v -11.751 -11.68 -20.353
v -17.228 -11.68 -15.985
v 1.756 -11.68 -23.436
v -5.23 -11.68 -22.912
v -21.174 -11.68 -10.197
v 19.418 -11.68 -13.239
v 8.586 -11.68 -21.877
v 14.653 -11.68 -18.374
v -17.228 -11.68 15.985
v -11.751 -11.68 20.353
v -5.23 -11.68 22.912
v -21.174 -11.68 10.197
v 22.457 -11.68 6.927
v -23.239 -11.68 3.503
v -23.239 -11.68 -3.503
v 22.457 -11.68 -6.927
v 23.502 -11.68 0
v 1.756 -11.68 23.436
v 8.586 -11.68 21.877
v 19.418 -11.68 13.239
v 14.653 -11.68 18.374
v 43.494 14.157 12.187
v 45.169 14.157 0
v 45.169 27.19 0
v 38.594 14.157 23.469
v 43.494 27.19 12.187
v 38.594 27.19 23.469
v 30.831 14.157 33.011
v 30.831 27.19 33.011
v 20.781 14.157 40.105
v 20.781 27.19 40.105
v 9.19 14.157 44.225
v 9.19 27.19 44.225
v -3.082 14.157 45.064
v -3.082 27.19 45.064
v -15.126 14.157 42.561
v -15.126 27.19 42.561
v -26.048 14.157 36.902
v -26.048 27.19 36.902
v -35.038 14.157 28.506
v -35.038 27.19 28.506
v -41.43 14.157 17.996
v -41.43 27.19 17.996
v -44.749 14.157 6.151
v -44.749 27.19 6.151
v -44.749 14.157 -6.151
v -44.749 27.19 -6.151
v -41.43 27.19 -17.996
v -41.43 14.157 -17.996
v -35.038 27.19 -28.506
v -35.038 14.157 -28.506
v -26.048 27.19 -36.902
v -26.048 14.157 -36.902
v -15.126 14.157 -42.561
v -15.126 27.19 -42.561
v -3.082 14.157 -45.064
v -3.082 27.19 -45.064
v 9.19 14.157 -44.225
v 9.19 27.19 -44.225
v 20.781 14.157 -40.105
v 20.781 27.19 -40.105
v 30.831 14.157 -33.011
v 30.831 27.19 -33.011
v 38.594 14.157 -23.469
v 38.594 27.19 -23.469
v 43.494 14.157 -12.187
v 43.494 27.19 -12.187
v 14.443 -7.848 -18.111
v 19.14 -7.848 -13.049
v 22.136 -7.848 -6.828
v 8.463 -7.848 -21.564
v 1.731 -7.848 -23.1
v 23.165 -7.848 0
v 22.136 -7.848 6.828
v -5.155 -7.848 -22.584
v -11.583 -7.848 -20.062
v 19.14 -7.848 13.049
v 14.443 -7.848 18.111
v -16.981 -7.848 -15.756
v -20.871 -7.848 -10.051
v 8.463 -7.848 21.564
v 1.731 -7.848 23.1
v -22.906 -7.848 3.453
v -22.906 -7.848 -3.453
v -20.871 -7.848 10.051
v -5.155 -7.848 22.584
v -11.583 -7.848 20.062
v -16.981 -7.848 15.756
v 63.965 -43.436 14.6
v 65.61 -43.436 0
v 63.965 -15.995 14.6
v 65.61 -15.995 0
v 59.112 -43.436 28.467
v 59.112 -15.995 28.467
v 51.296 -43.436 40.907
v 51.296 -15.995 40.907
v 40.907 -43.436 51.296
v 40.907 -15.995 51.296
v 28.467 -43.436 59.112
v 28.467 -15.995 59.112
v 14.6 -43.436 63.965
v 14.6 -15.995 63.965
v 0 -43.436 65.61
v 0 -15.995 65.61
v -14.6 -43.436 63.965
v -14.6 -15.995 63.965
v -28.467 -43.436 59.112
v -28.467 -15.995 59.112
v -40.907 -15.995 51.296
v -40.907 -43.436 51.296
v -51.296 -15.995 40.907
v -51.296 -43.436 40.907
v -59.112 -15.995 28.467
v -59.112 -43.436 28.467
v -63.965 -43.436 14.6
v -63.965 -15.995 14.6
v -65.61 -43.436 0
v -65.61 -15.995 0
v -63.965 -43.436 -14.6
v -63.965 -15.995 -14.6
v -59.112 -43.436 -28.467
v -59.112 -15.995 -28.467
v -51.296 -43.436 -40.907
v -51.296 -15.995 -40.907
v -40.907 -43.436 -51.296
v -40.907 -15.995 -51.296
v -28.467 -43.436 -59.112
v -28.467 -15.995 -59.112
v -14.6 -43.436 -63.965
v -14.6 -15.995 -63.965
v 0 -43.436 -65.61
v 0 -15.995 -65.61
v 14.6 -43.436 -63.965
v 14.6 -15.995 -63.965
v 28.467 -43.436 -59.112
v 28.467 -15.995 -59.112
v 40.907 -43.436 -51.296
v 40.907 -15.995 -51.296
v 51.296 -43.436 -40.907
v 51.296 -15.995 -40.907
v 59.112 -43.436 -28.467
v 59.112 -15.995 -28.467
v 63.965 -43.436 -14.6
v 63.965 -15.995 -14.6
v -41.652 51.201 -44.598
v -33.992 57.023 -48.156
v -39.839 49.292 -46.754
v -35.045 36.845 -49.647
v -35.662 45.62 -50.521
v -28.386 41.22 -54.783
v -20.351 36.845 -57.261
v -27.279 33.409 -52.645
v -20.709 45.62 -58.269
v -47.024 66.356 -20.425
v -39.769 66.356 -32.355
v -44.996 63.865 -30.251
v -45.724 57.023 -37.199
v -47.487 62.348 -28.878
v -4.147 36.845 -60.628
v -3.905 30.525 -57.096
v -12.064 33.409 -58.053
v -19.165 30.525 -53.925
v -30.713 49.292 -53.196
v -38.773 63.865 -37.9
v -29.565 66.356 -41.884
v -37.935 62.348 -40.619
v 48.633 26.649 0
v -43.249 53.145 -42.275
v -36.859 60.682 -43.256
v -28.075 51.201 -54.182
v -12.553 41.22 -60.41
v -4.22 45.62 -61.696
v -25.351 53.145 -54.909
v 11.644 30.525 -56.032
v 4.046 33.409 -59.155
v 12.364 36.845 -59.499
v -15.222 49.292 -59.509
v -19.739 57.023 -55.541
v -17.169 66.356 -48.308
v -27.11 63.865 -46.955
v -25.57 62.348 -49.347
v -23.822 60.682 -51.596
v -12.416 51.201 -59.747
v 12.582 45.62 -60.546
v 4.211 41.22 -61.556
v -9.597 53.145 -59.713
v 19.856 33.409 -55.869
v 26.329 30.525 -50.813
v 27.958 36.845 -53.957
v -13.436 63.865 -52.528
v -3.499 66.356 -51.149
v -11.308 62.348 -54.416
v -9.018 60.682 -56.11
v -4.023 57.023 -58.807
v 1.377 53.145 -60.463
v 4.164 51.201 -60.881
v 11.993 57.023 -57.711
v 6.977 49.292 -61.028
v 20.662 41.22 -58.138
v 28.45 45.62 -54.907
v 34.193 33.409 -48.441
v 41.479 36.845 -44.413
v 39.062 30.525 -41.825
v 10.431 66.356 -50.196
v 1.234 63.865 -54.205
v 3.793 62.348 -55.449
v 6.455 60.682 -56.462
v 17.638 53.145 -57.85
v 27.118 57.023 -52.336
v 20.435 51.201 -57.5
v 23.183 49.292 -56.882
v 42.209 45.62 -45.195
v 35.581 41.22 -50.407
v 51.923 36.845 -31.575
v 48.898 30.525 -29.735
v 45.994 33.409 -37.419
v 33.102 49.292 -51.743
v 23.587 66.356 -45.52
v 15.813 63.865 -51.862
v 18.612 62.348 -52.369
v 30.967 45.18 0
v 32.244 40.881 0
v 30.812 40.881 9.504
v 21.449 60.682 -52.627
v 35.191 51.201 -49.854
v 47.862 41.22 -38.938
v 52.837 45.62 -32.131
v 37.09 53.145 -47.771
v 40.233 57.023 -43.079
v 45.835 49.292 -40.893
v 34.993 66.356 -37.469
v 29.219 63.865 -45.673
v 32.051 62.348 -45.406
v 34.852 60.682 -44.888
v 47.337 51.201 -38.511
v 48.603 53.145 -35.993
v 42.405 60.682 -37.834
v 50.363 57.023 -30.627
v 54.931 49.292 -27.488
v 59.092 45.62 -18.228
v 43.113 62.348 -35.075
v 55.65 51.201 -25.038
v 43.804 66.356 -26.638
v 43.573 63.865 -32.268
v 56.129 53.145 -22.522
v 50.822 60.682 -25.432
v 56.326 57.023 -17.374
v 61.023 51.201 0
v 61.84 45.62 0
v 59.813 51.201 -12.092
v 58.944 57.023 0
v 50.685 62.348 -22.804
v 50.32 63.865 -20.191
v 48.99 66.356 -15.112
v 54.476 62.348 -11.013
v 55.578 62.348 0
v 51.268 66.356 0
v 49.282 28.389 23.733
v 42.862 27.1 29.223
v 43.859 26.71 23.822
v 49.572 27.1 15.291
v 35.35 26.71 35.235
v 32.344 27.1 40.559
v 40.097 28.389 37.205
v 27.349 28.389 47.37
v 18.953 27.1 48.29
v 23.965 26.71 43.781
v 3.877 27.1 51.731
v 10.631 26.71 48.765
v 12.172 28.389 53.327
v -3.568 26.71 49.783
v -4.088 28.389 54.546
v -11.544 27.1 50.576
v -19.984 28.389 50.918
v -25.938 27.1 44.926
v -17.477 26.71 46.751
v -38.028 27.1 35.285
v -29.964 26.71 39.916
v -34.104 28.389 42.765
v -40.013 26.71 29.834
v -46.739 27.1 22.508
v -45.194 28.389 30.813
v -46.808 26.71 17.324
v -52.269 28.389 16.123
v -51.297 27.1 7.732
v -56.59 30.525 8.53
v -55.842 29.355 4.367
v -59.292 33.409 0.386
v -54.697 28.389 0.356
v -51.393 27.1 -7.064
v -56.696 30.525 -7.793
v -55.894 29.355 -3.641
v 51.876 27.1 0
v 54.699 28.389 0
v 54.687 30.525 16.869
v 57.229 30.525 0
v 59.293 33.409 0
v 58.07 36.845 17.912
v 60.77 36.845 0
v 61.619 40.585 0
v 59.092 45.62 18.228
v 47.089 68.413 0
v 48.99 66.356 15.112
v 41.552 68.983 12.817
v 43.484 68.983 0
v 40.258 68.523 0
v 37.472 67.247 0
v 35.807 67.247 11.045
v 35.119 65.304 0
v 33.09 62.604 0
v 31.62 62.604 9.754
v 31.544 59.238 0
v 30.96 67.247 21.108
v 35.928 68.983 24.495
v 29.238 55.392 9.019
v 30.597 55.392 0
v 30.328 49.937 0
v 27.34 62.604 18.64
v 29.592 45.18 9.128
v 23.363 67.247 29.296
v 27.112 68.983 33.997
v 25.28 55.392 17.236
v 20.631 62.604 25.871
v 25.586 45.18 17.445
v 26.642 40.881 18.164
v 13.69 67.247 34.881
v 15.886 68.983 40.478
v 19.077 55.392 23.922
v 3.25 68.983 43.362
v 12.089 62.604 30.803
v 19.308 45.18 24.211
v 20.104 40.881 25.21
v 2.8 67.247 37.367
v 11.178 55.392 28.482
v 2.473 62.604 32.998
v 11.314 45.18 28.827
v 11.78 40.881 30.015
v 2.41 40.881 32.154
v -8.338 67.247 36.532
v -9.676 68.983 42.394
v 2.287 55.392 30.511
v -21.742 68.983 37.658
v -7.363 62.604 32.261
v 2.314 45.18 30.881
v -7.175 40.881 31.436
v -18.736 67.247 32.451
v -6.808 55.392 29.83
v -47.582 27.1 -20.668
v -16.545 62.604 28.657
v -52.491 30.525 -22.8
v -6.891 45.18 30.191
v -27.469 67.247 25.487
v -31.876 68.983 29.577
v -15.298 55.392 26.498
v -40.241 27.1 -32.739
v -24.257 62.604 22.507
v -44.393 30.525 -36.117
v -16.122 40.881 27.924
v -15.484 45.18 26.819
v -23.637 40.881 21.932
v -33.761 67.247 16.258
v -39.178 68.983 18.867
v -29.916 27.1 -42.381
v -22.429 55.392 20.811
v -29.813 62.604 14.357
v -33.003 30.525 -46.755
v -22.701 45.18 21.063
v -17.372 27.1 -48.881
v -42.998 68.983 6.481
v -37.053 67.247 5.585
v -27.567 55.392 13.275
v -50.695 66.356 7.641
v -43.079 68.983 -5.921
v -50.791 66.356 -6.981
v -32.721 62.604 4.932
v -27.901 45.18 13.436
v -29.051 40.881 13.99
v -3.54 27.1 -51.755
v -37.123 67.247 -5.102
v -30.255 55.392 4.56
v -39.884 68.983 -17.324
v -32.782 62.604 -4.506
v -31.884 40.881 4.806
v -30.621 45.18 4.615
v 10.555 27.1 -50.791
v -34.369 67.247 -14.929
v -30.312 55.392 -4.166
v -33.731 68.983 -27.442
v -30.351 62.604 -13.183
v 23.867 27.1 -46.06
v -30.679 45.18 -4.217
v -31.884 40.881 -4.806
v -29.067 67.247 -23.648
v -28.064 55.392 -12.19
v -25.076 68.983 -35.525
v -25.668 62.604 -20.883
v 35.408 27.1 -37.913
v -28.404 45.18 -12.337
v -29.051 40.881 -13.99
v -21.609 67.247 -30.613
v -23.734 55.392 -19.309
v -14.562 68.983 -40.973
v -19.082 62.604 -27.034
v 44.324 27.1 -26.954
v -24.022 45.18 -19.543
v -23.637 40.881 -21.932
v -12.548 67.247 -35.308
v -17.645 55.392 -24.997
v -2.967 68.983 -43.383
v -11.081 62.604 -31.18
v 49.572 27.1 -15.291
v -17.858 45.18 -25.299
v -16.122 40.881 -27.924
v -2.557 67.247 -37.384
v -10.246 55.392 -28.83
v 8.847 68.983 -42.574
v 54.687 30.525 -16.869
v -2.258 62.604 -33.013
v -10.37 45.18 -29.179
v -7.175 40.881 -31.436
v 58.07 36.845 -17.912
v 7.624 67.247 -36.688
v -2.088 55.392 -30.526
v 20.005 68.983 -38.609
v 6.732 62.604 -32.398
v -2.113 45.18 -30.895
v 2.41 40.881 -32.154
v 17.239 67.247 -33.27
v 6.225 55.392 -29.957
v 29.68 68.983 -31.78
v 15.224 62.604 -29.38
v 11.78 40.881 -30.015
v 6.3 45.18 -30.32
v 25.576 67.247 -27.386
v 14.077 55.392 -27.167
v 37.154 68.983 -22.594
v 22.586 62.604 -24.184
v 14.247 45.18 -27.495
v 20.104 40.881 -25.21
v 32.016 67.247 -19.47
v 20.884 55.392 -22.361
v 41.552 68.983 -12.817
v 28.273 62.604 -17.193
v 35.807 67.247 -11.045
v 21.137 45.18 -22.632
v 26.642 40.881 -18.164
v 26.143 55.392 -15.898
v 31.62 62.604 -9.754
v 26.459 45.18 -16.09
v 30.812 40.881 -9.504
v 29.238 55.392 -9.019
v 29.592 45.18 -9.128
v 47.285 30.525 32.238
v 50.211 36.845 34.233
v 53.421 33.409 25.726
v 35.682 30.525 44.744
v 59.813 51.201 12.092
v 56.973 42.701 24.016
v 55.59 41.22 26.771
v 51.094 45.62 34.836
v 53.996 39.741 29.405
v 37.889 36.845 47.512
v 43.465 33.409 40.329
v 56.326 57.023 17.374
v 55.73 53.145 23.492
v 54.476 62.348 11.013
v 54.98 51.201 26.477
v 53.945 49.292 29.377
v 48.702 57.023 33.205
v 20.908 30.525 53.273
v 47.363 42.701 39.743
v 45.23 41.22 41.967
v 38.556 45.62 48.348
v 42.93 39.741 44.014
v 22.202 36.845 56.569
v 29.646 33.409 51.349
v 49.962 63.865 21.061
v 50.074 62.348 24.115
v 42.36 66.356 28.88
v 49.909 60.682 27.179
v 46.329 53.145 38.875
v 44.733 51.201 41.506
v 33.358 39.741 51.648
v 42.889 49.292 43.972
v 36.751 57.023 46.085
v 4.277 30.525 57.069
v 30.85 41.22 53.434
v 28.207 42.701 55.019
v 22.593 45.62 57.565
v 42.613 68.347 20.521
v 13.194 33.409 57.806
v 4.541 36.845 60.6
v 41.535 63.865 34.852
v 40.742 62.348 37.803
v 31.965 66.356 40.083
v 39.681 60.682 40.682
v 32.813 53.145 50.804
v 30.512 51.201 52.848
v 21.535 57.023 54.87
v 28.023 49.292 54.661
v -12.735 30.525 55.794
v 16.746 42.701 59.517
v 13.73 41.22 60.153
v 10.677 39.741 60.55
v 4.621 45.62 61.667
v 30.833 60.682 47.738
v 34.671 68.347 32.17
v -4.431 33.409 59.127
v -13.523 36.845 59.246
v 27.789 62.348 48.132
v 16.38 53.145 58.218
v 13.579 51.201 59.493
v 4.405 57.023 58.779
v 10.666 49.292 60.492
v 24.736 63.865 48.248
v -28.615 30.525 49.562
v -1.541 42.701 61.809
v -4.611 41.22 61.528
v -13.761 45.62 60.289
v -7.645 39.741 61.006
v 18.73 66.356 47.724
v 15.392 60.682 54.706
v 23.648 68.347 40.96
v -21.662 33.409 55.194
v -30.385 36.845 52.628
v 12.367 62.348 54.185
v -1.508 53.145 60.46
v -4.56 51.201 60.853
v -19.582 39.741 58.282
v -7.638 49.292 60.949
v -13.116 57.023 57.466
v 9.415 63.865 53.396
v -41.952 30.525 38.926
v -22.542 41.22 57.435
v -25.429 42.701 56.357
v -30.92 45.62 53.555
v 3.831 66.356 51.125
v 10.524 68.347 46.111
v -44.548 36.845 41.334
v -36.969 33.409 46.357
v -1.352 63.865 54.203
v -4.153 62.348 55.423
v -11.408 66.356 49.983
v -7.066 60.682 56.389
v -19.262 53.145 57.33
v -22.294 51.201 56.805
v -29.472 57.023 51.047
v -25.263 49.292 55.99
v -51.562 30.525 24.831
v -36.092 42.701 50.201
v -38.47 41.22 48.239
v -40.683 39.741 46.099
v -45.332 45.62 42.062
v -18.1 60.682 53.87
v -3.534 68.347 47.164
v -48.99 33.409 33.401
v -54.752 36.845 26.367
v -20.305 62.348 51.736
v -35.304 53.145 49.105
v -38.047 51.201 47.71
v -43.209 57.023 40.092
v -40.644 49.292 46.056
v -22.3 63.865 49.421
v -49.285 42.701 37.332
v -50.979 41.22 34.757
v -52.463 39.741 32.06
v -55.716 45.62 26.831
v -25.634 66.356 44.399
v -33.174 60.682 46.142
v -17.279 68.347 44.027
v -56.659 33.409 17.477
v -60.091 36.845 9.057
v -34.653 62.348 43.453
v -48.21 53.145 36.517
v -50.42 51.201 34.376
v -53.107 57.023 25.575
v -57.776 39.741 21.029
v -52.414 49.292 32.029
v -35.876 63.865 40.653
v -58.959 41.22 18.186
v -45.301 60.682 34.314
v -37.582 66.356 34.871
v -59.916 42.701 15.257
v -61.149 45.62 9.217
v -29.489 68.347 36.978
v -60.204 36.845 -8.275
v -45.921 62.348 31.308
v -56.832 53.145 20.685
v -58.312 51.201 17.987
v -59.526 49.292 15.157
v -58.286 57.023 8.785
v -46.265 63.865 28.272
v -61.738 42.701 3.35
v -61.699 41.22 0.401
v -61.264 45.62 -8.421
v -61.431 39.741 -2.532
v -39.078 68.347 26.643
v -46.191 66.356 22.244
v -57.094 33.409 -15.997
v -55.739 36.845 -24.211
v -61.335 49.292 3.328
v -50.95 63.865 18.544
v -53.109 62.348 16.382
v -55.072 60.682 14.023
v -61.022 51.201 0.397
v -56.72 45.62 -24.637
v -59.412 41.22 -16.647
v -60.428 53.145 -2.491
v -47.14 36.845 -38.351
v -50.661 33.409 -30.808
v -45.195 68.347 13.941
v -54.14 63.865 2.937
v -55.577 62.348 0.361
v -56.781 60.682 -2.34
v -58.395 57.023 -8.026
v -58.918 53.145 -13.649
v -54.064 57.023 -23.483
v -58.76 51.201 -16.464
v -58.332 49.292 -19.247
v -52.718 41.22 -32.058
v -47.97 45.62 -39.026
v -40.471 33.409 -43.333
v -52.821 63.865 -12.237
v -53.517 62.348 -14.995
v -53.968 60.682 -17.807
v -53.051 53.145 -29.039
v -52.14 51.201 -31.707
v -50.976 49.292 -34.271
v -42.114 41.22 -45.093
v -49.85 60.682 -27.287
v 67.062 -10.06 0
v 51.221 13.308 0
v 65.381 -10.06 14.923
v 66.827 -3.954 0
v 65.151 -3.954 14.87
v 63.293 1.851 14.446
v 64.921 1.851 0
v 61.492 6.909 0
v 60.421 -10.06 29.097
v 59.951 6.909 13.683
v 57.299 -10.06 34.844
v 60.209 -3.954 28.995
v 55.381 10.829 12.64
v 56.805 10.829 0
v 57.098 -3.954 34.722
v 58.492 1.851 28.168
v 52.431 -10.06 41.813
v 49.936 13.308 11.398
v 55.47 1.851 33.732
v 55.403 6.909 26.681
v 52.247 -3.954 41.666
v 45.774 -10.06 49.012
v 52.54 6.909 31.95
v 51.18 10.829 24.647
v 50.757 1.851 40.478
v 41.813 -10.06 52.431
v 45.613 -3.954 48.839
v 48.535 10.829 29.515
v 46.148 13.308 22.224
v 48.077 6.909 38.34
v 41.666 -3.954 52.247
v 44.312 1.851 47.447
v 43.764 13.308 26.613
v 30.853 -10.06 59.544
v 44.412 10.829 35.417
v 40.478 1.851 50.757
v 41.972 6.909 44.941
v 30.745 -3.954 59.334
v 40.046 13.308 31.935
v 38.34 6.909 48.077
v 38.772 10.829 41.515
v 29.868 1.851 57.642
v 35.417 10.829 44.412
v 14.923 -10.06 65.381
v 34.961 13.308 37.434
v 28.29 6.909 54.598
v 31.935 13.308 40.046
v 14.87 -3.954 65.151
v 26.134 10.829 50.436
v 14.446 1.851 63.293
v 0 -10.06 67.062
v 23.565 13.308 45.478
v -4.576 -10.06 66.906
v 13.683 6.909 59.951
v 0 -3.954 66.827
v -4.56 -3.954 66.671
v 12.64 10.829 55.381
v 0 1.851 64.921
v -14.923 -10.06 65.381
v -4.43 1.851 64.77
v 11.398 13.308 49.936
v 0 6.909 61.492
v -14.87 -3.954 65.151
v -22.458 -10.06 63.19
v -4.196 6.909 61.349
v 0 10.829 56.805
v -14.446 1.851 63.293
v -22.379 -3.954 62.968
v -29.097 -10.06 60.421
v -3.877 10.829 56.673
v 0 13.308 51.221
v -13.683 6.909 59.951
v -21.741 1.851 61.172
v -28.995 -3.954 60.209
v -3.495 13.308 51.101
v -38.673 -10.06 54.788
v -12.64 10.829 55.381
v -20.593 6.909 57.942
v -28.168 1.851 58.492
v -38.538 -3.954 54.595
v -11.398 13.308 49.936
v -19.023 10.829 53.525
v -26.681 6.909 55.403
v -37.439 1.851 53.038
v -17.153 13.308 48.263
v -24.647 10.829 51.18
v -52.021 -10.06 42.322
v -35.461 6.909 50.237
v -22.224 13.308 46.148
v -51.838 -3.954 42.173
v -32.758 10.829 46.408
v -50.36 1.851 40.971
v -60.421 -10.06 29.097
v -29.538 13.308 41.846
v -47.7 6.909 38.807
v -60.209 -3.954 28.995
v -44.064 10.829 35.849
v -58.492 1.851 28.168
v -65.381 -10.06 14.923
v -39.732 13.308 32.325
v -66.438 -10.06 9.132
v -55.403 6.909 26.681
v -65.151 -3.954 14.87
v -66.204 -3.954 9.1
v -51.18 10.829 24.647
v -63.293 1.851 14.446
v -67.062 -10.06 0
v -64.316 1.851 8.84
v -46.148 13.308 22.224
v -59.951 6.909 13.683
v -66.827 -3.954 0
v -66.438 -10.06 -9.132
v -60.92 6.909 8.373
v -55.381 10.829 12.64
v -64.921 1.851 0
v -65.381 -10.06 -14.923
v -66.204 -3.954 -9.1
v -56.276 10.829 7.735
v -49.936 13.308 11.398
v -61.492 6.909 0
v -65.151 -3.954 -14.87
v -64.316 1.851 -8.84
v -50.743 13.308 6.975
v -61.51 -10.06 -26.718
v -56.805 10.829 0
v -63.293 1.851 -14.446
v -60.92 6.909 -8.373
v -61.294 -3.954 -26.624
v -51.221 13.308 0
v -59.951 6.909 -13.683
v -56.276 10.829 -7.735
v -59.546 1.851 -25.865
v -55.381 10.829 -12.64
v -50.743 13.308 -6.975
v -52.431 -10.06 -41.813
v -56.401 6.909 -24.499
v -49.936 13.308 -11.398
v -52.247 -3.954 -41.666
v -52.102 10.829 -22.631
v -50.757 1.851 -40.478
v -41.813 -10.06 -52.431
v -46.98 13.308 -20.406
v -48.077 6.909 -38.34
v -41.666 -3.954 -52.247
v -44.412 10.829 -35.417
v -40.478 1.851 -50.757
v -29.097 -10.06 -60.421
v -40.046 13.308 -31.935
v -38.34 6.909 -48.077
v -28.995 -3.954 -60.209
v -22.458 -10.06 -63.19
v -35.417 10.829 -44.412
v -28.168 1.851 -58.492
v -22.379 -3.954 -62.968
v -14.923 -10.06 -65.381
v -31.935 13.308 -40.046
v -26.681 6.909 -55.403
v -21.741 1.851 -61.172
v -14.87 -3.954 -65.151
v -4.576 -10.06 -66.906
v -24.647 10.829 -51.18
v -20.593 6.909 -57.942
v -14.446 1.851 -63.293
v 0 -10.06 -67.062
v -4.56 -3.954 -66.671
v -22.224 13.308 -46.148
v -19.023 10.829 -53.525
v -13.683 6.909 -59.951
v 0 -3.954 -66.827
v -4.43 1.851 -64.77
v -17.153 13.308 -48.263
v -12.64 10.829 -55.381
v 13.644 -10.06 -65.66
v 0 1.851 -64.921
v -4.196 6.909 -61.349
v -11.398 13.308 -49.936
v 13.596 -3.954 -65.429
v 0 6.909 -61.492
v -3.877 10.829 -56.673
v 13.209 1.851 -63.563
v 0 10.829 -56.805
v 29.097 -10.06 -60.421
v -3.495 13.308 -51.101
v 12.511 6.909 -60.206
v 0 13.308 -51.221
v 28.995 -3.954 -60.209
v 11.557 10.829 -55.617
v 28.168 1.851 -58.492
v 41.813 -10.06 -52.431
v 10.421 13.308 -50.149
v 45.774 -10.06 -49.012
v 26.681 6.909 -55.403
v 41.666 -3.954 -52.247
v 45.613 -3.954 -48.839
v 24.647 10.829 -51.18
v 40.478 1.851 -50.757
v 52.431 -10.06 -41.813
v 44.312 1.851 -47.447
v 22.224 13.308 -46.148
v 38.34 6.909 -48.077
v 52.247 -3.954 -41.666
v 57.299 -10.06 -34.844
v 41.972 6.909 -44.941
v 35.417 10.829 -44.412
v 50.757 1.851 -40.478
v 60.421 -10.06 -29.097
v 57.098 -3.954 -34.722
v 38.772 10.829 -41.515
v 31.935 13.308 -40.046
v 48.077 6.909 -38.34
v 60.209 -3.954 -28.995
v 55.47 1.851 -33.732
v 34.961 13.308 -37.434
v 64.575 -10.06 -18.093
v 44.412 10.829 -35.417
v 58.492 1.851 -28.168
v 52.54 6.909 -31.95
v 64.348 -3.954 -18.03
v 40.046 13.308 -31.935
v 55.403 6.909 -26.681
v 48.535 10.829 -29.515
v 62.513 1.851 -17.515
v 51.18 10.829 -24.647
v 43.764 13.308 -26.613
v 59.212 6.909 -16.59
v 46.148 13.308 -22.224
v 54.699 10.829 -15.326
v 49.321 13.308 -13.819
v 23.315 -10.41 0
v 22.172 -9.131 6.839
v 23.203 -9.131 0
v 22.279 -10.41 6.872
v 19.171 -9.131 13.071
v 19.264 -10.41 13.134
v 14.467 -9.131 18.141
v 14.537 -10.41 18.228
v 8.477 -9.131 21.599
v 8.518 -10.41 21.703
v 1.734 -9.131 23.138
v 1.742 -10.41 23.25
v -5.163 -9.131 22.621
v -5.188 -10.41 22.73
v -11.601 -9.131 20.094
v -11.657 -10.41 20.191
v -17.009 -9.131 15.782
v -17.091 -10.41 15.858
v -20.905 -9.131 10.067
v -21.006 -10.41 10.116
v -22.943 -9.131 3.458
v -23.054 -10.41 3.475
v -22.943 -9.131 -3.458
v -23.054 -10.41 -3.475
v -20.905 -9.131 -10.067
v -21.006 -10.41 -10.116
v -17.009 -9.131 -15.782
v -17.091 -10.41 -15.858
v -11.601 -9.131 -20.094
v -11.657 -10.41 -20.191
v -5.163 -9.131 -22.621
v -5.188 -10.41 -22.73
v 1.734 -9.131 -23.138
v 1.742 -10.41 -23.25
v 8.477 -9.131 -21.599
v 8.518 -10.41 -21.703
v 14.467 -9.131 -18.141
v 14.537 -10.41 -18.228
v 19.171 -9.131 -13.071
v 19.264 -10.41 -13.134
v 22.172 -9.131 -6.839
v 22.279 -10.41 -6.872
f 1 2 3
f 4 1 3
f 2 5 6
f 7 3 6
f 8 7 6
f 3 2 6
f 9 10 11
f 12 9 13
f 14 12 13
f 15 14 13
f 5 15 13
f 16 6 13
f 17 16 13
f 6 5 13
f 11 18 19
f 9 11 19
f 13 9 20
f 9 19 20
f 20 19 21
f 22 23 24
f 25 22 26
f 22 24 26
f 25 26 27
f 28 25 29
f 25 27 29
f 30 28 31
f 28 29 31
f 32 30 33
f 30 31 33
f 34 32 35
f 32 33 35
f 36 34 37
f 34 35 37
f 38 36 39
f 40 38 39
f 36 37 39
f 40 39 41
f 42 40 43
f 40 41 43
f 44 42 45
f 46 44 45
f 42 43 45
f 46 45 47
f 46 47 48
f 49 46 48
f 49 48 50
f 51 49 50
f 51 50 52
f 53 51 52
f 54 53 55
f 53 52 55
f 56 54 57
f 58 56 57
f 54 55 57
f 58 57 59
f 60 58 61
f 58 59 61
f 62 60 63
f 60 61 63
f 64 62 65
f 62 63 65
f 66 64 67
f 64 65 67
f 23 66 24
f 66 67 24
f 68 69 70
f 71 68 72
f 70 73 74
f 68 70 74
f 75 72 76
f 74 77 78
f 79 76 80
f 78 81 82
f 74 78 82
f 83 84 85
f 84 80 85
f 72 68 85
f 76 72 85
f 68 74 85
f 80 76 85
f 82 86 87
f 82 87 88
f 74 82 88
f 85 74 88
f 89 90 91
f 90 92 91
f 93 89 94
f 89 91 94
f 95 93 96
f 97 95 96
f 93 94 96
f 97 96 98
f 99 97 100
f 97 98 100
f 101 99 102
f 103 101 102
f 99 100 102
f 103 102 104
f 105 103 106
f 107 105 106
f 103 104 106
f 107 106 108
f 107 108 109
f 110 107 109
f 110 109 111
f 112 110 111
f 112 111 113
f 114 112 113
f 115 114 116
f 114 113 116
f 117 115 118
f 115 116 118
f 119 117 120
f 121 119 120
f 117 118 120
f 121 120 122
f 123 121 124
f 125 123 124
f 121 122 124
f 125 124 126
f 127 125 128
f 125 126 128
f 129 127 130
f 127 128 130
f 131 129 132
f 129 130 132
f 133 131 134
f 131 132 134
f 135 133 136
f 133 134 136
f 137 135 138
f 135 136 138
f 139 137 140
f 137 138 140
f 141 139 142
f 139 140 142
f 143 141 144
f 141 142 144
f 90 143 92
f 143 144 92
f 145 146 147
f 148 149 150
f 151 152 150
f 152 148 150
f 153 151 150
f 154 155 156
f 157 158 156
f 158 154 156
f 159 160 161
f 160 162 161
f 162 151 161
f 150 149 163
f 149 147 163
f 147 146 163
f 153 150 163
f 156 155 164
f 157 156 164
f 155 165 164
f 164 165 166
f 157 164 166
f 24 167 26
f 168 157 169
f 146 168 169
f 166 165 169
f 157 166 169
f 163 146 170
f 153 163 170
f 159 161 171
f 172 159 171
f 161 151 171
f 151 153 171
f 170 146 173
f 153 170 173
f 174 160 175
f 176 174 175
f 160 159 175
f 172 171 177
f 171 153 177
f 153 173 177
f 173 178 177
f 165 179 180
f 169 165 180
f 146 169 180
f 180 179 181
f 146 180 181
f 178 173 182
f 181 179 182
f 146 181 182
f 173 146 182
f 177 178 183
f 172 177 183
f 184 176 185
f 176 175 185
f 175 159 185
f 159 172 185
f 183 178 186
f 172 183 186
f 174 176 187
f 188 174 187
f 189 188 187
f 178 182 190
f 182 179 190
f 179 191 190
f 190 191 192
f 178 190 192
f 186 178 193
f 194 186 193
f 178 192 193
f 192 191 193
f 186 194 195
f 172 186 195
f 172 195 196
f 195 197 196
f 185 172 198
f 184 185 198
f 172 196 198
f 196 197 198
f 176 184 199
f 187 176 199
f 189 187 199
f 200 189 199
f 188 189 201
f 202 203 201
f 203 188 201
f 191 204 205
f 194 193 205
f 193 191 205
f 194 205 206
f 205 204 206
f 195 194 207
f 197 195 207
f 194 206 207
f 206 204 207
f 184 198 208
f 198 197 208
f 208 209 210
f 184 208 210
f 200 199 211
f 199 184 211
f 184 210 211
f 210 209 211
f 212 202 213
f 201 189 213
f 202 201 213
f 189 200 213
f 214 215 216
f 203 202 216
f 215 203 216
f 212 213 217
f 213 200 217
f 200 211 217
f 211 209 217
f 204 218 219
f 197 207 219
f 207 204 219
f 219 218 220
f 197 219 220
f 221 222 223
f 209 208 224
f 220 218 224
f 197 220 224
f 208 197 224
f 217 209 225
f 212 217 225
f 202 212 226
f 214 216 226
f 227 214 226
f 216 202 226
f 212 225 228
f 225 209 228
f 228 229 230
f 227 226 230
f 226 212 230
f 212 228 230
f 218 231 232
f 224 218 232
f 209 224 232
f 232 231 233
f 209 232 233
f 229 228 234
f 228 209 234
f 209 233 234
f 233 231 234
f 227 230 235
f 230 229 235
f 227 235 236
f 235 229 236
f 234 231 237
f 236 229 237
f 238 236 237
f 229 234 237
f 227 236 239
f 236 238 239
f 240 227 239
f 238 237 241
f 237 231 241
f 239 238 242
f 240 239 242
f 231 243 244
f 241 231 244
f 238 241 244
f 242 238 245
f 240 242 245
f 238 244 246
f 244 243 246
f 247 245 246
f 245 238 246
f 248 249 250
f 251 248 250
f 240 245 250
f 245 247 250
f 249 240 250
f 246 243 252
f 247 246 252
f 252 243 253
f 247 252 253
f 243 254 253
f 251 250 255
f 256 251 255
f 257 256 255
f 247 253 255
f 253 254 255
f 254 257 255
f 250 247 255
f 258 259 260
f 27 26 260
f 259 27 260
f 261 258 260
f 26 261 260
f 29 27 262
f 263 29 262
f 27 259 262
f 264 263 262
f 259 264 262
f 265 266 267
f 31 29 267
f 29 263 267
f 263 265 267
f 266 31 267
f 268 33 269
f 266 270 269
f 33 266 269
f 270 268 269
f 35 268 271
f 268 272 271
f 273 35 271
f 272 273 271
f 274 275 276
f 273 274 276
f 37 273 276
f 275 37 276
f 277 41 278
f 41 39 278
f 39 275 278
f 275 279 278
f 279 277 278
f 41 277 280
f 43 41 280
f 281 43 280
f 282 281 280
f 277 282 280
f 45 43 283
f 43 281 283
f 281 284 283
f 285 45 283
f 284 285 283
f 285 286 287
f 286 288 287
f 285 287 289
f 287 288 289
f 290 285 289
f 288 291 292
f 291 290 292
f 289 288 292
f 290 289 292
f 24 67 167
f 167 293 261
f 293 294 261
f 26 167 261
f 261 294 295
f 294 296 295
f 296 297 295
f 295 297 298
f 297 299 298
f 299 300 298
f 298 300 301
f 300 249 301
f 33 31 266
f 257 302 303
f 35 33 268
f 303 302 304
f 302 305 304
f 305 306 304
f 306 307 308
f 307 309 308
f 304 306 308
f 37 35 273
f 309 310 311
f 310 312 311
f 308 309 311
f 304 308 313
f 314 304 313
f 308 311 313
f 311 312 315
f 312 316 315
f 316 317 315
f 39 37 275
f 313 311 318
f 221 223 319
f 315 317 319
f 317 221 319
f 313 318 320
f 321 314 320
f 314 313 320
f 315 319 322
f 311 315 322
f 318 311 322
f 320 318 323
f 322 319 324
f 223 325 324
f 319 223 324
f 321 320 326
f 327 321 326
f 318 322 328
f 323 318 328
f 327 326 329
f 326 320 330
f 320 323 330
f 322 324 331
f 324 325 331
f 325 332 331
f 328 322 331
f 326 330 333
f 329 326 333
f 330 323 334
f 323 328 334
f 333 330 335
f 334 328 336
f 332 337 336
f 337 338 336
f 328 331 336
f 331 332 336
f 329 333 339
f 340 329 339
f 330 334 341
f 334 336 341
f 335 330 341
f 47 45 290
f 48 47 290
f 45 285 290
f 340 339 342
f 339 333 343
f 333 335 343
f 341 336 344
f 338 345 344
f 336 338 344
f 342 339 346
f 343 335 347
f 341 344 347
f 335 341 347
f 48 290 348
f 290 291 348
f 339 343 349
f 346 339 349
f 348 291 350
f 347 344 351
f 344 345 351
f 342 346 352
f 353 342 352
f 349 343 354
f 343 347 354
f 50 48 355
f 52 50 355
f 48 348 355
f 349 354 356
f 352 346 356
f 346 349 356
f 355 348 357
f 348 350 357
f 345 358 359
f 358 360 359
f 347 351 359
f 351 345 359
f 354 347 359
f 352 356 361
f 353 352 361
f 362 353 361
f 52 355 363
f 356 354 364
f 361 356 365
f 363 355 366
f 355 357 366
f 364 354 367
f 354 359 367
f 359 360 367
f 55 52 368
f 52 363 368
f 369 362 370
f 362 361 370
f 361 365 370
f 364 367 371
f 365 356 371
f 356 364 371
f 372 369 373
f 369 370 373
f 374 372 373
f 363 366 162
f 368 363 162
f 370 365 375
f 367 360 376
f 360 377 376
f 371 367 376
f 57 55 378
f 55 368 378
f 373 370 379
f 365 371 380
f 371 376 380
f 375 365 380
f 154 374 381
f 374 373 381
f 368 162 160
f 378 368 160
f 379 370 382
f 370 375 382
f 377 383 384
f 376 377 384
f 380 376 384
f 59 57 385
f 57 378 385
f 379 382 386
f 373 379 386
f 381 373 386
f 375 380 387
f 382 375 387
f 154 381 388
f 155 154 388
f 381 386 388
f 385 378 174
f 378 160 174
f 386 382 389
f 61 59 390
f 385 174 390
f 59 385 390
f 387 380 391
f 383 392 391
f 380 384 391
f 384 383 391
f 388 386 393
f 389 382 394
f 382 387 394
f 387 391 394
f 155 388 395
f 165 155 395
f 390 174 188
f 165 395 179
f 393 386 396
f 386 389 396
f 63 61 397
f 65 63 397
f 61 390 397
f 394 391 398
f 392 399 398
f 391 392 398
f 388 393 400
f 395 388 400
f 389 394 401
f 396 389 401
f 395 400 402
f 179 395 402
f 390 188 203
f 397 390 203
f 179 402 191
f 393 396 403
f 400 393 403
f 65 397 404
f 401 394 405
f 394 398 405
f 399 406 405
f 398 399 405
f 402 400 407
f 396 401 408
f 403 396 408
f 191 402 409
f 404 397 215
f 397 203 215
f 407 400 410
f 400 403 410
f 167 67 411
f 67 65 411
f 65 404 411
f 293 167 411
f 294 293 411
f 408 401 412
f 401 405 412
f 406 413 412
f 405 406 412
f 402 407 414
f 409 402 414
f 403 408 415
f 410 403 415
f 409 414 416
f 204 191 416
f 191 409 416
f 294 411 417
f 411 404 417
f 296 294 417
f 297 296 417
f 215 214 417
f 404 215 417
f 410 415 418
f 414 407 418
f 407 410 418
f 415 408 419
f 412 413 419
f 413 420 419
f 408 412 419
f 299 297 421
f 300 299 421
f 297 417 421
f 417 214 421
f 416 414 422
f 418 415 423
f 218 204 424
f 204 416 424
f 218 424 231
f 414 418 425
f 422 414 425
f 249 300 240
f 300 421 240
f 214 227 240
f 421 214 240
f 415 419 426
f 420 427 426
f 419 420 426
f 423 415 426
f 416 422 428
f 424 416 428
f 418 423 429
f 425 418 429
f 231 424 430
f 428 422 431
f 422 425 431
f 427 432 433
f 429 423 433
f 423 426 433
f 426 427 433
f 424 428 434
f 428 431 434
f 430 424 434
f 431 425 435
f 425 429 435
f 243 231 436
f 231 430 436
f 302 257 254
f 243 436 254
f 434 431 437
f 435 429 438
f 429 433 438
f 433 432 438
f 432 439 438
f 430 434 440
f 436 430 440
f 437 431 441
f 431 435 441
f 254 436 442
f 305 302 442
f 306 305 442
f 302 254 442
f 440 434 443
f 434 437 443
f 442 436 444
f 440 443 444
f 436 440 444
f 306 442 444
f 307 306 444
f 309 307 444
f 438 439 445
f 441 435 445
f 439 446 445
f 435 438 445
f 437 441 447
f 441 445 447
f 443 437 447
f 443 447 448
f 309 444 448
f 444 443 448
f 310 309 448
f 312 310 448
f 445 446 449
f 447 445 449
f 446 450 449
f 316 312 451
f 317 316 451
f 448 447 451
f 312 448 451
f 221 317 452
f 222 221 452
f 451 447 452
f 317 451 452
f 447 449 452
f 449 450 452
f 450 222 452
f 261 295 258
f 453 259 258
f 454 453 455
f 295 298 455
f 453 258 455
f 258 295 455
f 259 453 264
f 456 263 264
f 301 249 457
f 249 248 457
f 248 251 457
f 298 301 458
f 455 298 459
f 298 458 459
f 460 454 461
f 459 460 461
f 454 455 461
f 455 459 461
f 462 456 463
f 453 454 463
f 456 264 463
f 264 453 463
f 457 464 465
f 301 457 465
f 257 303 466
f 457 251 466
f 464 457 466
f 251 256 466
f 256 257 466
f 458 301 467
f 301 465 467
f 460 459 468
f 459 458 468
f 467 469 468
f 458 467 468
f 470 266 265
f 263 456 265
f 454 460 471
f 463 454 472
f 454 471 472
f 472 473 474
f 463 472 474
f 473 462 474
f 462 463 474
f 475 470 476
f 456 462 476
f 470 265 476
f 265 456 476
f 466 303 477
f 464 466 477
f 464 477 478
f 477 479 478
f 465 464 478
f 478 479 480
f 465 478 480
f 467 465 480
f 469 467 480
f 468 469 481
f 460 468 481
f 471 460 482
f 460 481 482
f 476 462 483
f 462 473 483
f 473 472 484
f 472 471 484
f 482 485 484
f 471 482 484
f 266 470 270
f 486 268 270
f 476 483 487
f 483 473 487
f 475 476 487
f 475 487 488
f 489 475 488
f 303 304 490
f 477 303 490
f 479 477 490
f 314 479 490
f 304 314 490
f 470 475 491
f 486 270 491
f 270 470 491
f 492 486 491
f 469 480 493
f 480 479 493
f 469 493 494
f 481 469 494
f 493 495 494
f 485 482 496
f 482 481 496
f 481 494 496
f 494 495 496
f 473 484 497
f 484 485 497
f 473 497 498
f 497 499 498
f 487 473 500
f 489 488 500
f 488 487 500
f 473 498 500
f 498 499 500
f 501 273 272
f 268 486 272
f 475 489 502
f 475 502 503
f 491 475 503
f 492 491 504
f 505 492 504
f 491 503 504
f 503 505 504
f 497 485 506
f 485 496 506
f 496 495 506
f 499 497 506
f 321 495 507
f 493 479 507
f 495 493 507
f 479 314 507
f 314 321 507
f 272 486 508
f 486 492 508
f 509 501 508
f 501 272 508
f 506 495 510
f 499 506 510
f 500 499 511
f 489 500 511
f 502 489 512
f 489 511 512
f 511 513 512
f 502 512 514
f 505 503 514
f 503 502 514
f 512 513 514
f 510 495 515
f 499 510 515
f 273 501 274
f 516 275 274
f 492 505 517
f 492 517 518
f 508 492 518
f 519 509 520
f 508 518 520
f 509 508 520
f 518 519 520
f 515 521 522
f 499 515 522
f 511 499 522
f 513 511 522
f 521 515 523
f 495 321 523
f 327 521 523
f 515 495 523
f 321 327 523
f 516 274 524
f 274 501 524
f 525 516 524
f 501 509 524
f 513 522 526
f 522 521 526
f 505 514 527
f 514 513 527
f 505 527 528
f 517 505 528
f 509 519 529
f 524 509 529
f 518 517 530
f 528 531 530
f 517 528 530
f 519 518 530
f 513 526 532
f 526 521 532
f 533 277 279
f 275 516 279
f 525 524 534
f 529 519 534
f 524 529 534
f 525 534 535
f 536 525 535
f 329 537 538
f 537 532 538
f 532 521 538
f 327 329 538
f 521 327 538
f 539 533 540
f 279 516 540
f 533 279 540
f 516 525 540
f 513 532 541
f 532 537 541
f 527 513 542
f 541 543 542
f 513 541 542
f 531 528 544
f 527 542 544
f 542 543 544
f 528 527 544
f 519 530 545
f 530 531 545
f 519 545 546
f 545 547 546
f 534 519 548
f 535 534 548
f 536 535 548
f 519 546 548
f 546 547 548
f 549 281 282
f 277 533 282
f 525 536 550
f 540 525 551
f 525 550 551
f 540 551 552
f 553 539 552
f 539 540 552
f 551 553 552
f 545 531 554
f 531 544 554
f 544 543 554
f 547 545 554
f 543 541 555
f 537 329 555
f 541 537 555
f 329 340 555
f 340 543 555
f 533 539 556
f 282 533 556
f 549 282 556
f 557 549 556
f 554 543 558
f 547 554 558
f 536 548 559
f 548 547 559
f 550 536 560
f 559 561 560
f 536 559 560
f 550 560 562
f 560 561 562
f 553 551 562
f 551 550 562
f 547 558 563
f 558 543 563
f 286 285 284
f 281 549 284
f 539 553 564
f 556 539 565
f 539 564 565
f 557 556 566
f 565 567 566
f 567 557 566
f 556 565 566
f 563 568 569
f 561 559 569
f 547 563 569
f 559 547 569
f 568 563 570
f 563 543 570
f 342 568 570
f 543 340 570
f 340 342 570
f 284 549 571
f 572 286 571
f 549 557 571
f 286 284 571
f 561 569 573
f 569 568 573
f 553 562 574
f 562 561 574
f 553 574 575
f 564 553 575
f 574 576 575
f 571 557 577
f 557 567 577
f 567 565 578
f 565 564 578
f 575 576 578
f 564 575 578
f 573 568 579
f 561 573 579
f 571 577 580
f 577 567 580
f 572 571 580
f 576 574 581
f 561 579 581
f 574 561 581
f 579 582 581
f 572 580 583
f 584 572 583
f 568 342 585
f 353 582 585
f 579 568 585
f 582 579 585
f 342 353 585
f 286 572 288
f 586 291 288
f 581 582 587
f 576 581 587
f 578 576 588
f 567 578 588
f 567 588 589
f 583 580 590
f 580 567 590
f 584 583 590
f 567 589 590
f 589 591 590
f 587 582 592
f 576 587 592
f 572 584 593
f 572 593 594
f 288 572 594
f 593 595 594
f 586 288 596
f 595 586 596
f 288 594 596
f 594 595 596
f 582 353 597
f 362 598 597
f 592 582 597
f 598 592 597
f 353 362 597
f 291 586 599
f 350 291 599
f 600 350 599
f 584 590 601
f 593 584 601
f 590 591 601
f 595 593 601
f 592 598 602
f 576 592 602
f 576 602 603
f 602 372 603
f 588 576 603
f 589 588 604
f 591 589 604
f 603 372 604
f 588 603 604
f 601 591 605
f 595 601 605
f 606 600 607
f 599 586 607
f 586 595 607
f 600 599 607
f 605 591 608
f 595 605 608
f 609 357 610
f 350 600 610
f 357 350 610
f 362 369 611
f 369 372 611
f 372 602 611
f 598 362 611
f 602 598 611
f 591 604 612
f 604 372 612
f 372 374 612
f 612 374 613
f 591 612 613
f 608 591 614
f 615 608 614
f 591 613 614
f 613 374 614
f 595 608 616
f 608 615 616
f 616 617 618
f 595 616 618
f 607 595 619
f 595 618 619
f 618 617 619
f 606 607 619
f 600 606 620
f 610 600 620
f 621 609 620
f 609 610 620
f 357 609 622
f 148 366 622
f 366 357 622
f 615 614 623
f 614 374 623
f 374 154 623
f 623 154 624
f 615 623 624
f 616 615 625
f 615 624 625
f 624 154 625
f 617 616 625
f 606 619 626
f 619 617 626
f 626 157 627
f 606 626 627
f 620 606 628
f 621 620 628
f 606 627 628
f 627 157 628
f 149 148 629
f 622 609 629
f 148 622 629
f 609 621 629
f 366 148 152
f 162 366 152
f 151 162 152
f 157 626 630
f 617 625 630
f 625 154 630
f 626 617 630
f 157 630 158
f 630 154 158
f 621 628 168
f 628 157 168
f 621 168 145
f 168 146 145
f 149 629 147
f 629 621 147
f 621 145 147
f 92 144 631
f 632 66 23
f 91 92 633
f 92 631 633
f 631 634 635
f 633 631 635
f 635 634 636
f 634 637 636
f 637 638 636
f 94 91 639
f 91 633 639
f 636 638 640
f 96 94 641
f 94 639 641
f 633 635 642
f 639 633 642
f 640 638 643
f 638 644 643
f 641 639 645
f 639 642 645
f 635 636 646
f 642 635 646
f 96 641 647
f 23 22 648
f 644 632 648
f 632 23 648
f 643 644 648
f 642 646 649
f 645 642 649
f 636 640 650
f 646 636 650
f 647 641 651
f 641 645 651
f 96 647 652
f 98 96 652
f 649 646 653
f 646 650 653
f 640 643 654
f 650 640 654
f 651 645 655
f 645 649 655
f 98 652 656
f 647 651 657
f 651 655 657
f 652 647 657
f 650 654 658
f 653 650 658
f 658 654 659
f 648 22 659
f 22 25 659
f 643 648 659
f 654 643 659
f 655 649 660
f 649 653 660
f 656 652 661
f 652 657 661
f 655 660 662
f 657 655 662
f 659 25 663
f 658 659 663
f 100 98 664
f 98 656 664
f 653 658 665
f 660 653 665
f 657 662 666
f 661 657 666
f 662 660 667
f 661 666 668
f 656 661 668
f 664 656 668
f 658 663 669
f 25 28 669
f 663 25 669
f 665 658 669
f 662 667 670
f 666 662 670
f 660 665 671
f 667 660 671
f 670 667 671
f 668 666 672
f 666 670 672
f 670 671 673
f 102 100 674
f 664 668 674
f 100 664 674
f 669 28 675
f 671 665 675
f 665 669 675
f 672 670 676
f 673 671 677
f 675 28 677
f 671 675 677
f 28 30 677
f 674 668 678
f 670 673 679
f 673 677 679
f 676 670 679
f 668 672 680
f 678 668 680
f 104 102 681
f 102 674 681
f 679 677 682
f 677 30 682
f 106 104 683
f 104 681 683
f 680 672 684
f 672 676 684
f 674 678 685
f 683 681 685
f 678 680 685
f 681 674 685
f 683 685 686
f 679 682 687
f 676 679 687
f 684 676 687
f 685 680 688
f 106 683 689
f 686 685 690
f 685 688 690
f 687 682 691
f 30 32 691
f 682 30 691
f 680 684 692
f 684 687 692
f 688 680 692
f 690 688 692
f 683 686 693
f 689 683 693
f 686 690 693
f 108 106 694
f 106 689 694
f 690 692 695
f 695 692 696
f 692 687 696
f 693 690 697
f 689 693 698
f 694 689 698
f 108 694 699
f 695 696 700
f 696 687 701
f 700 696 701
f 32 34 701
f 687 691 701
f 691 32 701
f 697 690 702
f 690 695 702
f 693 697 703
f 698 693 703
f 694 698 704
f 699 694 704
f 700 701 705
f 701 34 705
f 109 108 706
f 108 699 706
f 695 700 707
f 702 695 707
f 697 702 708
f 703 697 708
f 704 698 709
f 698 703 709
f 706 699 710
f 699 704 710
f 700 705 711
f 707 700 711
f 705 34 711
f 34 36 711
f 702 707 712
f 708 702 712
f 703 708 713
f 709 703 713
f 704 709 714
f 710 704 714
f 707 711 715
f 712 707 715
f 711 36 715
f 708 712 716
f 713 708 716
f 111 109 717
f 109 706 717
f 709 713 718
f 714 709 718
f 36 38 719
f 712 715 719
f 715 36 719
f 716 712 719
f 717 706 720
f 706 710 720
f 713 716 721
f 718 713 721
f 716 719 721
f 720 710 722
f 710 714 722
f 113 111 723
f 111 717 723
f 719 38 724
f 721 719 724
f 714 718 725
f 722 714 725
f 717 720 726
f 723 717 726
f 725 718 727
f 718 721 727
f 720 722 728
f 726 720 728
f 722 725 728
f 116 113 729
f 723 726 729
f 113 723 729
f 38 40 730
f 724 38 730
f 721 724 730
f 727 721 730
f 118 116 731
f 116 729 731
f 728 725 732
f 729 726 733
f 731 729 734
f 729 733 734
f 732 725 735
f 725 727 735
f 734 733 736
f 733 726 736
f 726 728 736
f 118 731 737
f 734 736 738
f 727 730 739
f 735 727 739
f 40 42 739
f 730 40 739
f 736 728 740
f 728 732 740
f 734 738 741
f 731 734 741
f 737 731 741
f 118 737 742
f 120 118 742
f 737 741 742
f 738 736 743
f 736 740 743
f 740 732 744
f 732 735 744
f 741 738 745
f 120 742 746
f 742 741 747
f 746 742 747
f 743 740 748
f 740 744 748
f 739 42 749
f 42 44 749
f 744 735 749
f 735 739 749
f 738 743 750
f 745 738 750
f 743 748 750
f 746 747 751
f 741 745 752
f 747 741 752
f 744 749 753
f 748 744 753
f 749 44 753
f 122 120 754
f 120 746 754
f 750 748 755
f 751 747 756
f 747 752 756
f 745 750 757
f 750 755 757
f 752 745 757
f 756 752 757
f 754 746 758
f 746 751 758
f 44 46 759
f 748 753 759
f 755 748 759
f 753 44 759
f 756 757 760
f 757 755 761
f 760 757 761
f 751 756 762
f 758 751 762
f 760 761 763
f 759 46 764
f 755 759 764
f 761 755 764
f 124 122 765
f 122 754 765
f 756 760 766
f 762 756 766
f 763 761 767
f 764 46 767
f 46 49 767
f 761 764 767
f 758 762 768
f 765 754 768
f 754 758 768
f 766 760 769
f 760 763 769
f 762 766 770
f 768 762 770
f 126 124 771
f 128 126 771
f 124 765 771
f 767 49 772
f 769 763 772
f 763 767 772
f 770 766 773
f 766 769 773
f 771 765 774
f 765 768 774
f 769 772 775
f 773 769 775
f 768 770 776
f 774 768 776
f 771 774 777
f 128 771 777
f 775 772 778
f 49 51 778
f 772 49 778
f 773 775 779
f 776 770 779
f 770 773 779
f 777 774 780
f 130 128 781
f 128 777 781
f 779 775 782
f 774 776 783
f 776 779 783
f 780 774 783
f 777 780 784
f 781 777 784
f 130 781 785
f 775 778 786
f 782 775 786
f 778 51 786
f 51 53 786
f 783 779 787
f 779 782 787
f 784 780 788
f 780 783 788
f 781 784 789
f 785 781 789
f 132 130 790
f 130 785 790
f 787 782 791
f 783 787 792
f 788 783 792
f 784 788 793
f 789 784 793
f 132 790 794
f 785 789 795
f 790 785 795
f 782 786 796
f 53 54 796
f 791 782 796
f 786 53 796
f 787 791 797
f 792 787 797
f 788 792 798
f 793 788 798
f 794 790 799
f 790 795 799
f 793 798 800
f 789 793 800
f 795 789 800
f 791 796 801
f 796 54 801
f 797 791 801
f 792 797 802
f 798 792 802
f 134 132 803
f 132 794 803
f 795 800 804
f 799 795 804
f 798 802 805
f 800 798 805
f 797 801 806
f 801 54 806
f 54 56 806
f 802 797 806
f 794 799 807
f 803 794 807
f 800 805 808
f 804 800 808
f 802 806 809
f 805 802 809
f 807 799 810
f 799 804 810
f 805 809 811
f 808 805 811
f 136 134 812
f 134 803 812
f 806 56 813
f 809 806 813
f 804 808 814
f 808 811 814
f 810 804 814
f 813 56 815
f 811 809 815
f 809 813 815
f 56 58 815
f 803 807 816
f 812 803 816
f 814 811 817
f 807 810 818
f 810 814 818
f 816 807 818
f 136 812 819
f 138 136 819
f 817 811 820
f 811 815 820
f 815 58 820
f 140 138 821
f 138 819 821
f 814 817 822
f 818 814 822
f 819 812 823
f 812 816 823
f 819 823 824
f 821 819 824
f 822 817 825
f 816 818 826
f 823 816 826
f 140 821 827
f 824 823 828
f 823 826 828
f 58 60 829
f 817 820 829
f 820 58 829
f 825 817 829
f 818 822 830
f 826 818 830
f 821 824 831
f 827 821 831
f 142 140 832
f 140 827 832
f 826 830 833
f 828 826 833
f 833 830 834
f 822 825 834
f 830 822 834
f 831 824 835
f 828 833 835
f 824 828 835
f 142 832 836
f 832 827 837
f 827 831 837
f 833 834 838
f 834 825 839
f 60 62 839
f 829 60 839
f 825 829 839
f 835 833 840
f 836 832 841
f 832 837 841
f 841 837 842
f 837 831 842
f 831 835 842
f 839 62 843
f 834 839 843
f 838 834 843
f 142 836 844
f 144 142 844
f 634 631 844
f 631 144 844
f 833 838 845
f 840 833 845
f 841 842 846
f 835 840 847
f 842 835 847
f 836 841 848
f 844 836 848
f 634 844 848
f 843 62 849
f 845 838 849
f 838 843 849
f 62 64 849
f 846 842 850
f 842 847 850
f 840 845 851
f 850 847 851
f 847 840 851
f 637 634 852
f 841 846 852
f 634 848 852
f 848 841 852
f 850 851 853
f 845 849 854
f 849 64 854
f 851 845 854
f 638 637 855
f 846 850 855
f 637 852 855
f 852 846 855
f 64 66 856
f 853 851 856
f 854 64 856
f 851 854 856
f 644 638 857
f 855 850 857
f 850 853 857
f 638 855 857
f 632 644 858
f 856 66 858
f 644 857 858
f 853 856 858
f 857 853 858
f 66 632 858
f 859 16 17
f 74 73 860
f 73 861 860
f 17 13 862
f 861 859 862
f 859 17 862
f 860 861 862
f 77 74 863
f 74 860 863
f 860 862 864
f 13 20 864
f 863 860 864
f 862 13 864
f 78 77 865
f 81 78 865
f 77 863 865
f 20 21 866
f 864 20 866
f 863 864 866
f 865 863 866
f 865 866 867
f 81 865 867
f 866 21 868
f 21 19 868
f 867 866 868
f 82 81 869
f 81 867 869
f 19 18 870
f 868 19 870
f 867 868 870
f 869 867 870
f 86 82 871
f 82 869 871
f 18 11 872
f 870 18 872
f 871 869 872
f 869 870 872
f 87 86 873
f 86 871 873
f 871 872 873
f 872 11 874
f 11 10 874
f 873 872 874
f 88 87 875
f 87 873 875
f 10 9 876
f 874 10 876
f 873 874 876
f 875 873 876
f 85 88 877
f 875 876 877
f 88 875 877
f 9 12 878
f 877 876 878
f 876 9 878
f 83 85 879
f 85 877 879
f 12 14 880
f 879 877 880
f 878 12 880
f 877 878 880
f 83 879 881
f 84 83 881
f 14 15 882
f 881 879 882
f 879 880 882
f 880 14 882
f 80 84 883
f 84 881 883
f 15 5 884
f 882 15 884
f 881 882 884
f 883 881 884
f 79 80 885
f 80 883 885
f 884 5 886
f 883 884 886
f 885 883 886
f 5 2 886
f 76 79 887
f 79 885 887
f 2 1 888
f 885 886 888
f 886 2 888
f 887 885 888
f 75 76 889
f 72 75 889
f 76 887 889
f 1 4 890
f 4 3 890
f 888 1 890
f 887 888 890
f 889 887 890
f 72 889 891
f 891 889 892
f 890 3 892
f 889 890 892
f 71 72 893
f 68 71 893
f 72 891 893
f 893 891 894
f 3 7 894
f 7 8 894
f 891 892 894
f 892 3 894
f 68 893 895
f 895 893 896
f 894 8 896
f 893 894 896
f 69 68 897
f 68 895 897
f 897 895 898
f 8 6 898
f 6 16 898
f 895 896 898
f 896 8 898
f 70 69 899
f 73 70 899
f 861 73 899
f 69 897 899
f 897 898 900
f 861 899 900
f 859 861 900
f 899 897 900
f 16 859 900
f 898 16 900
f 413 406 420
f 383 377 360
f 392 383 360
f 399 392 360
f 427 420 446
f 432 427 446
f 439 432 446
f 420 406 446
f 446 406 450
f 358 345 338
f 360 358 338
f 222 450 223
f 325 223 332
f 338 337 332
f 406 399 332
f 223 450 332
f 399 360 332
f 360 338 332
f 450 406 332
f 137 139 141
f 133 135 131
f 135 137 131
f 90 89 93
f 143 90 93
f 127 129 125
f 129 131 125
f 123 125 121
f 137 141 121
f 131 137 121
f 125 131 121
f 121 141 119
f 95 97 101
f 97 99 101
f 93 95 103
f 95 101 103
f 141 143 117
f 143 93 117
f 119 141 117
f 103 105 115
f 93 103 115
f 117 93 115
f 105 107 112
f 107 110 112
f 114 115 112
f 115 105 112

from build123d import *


with BuildPart() as f1:
    # F0 (on Top) → F1 (revolve)
    with BuildSketch(Plane.XY):
        with BuildLine():
            Line((32.2443948891, 40.8806465566), (0, 40.8806465566))
            Line((0, 40.8806465566), (0, -7.8476248309))
            Line((0, -7.8476248309), (23.1651897523, -7.8476248309))
            ThreePointArc((23.1651897523, -7.8476248309), (23.2494349236, -9.7712701453), (23.5015253586, -11.6801857948))
            Line((23.5015253586, -11.6801857948), (0, -11.6801857948))
            Line((0, -11.6801857948), (0, -43.4356927872))
            Line((0, -43.4356927872), (65.6097978354, -43.4356927872))
            Line((65.6097978354, -43.4356927872), (65.6097978354, -15.9950943577))
            ThreePointArc((65.6097978354, -15.9950943577), (63.3830284541, 4.4996240423), (45.1694689691, 14.1566543859))
            Line((45.1694689691, 14.1566543859), (45.1694689691, 27.1900529973))
            add(Edge.make_bspline(
                [(45.1694689691, 27.1900529973), (64.1933435471, 21.4488804325), (61.7417399221, 46.9721411104), (59.2901362971, 72.4954017883), (41.1770152264, 68.7548624879), (23.0638941557, 65.0143231875), (32.2443948891, 40.8806465566)],
                knots=[5.8712915917, 5.8712915917, 5.8712915917, 7.6289194311, 7.6289194311, 9.3865472704, 9.3865472704, 11.1441751097, 11.1441751097, 11.1441751097], degree=2, weights=[1, 0.638064854, 1, 0.638064854, 1, 0.638064854, 1]))
        make_face()
    revolve(axis=Axis((0, 0.4562586546, 0), (0, -1, 0)))


solid = f1.part
